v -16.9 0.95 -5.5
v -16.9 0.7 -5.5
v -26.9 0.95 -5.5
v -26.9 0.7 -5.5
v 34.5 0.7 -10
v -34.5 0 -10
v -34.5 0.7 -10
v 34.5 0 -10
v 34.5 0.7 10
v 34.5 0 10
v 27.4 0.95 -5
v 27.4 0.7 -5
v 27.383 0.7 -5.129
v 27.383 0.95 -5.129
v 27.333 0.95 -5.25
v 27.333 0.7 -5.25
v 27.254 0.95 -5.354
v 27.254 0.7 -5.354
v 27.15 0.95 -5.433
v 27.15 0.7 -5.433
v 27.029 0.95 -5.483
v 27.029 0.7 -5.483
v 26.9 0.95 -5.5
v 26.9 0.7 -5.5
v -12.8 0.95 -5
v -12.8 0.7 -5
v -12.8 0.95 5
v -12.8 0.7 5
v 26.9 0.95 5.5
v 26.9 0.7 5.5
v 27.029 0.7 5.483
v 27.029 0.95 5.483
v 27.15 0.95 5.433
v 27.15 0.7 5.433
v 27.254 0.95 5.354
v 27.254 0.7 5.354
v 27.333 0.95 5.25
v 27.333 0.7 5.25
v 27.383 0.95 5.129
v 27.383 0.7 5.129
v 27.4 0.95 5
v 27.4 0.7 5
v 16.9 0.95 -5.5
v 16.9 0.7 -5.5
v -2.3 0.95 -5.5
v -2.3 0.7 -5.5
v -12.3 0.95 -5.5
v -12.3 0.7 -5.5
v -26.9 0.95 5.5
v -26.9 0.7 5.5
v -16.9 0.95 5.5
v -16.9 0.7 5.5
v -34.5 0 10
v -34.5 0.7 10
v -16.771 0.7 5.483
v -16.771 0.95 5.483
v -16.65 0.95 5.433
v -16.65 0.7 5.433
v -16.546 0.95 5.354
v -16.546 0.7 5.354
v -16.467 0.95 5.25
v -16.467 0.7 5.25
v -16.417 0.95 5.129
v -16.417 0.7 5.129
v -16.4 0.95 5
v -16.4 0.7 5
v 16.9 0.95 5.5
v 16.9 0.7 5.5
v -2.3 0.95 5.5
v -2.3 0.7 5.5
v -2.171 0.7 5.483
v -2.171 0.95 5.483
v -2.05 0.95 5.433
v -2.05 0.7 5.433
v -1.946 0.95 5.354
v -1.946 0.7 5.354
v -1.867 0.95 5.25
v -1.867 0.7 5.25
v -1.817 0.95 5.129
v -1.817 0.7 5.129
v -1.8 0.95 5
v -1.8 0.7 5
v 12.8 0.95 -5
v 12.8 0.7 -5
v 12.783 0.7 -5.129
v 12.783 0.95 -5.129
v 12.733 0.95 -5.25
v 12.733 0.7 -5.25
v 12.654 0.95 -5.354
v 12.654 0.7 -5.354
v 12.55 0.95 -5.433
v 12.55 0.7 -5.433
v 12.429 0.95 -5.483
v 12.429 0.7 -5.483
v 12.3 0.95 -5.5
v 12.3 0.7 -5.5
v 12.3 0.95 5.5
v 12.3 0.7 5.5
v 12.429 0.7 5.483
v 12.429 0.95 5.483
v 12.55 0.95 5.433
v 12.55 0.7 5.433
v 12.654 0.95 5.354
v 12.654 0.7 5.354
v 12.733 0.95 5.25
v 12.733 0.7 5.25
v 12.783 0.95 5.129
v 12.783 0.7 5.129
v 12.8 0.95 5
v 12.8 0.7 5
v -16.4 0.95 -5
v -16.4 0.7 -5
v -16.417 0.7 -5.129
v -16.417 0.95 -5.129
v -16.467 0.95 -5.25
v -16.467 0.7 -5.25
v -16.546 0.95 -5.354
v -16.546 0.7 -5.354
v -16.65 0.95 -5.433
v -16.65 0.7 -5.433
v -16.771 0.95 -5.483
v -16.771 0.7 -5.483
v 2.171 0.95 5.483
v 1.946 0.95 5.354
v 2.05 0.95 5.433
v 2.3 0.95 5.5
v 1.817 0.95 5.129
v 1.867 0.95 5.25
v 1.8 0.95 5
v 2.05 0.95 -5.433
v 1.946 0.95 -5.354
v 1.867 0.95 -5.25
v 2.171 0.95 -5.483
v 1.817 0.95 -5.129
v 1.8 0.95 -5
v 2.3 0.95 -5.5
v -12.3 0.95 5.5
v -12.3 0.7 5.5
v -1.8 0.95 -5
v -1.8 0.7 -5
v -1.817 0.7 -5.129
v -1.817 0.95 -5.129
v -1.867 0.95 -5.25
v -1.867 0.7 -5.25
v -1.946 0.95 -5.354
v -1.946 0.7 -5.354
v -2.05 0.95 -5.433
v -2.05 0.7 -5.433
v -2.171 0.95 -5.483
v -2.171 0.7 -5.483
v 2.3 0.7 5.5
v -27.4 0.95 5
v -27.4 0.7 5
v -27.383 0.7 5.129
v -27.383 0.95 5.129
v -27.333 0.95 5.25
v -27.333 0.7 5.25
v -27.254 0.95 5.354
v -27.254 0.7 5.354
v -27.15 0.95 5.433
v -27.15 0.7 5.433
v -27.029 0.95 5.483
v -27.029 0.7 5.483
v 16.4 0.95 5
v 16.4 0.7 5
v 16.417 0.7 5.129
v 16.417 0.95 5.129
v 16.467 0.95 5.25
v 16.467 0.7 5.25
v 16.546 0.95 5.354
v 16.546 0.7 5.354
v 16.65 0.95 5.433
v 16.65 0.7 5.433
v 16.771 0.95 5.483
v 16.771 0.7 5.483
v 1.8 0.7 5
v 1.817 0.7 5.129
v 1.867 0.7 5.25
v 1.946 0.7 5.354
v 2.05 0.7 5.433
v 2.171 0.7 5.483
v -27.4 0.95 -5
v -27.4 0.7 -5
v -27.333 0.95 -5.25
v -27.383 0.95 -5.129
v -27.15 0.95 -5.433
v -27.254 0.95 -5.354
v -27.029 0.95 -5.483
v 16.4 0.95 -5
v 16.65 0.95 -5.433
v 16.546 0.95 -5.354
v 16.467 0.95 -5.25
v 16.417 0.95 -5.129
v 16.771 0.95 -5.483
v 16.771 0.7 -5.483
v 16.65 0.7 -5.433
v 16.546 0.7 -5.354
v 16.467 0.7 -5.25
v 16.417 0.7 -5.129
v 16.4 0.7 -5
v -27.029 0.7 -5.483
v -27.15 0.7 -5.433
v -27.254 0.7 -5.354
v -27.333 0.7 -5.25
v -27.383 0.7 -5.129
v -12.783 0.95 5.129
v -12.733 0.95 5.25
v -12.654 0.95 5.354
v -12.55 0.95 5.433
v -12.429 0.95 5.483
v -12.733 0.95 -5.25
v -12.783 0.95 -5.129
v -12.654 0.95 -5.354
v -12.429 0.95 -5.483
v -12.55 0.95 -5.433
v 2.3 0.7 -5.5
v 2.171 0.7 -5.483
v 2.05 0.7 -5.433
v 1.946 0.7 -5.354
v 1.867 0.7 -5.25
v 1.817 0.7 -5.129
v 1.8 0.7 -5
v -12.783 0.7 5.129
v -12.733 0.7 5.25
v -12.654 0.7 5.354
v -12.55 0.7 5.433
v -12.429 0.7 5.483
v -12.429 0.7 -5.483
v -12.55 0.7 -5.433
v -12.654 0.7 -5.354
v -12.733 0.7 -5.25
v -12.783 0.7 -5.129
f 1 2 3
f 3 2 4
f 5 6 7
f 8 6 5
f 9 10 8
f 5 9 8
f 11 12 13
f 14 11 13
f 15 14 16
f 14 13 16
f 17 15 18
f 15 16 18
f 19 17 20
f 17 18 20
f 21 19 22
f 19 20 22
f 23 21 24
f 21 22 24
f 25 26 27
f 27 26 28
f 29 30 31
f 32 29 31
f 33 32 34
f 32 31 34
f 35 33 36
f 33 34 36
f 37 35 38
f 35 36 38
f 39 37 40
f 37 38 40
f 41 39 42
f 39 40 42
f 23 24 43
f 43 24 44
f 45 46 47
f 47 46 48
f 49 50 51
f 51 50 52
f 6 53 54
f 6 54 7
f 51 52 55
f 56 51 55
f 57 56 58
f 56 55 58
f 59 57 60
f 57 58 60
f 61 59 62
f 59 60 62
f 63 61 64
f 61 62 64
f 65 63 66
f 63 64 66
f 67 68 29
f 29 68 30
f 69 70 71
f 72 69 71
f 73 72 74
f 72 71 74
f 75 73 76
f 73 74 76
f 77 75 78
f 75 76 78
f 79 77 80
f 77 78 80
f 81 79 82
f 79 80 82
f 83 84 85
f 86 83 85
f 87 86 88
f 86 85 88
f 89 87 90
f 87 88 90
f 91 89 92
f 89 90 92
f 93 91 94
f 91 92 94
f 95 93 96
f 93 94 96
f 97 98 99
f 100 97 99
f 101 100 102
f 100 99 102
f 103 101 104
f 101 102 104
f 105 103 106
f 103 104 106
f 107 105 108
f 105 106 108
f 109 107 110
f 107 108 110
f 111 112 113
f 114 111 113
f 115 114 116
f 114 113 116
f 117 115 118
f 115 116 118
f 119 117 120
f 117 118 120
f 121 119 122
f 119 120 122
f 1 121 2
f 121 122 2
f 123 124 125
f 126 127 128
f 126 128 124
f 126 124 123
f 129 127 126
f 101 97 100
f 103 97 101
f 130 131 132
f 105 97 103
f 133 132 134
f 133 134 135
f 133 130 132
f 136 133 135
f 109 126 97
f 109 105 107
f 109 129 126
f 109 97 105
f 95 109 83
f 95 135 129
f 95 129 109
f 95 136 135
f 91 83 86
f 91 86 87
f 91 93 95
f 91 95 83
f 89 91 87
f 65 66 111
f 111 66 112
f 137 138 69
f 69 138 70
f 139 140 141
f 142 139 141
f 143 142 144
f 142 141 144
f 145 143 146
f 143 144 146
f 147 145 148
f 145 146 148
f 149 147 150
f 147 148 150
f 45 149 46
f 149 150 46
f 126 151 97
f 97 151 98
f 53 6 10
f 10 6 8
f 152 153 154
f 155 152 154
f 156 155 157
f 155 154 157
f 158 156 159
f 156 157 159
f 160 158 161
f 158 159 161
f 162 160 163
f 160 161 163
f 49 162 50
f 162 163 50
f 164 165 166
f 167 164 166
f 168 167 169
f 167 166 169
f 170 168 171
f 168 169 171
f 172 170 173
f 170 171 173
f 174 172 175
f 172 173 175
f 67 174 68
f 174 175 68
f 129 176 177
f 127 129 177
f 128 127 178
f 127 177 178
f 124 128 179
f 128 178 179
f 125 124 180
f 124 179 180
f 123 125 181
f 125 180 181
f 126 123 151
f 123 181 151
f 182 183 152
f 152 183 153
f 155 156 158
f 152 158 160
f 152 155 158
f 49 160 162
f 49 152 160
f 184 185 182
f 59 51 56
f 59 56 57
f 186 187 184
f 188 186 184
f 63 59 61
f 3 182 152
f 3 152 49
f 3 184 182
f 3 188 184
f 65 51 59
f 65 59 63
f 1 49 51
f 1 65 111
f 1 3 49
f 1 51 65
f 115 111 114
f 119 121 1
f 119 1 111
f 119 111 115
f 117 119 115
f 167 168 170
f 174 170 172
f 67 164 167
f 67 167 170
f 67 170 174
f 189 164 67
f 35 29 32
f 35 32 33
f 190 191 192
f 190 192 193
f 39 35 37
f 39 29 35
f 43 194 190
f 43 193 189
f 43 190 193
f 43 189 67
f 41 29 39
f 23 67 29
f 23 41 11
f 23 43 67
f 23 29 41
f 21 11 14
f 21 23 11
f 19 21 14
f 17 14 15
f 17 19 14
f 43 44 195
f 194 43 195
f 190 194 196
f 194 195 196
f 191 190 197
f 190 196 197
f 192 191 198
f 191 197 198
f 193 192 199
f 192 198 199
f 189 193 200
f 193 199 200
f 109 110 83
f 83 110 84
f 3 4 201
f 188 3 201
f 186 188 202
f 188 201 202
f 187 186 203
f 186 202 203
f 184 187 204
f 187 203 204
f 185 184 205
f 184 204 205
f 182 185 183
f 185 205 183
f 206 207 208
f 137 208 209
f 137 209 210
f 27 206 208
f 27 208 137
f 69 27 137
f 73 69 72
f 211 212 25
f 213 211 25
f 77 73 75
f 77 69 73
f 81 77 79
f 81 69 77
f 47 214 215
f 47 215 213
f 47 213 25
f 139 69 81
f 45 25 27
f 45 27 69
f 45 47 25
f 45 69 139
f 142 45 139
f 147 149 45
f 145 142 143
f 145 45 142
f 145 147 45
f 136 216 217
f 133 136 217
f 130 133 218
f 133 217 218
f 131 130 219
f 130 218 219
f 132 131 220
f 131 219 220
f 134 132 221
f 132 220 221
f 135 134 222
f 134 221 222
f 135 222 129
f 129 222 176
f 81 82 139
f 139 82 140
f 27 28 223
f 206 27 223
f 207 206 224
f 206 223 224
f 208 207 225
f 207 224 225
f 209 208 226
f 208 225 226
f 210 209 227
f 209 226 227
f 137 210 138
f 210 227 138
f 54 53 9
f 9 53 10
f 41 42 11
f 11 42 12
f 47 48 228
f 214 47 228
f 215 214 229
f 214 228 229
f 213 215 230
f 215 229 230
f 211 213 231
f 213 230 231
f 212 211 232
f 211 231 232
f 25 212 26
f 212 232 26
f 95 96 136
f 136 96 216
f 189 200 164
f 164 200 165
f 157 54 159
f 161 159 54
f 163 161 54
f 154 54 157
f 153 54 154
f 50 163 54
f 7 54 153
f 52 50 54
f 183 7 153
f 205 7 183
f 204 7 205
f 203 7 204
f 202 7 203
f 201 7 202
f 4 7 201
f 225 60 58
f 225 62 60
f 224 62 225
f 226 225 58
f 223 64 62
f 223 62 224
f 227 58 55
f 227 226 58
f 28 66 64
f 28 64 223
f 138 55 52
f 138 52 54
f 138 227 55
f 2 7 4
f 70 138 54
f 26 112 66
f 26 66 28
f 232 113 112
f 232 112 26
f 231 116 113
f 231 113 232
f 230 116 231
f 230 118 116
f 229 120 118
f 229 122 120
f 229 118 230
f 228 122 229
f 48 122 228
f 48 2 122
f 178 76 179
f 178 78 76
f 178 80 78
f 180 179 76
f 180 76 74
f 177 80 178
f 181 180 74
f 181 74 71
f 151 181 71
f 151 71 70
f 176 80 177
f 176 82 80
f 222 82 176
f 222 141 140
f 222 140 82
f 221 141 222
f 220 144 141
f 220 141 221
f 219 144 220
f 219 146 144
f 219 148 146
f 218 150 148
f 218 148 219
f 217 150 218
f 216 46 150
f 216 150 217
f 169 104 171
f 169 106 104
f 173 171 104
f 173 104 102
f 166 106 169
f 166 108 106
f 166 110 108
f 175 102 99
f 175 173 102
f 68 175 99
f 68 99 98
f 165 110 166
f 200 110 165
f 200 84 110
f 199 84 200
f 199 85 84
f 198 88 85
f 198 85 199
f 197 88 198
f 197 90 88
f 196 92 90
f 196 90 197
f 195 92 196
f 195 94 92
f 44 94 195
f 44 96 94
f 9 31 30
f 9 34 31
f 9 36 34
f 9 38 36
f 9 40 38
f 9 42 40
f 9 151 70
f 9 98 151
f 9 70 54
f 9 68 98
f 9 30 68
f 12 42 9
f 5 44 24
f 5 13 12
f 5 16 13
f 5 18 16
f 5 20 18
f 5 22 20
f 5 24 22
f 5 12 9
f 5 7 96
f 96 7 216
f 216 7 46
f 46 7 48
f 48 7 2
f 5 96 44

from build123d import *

# Parameters (mm, degrees)
SKETCH1_W           = 69
SKETCH1_H           = 20
BOSS_EXTRUDE1_DEPTH = 0.7
BOSS_EXTRUDE2_DEPTH = 0.25


with BuildPart() as part:
    # Sketch1 → Boss-Extrude1 (new body)
    with BuildSketch(Plane(origin=(0, 0, 0), x_dir=(1, 0, 0), z_dir=(0, 1, 0))):
        Rectangle(SKETCH1_W, SKETCH1_H)
    extrude(amount=BOSS_EXTRUDE1_DEPTH)

    # Sketch2 → Boss-Extrude2 (add)
    with BuildSketch(Plane(origin=(0, 0.7, 0), x_dir=(1, 0, 0), z_dir=(0, 1, 0))):
        with BuildLine():
            Line((-26.9, -5.5), (-16.9, -5.5))
            ThreePointArc((-16.9, -5.5), (-16.546446609, -5.353553391), (-16.4, -5))
            Line((-16.4, -5), (-16.4, 5))
            ThreePointArc((-16.4, 5), (-16.546446609, 5.353553391), (-16.9, 5.5))
            Line((-16.9, 5.5), (-26.9, 5.5))
            ThreePointArc((-26.9, 5.5), (-27.253553391, 5.353553391), (-27.4, 5))
            Line((-27.4, 5), (-27.4, -5))
            ThreePointArc((-27.4, -5), (-27.253553391, -5.353553391), (-26.9, -5.5))
        make_face()
        with BuildLine():
            Line((-12.3, -5.5), (-2.3, -5.5))
            ThreePointArc((-2.3, -5.5), (-1.946446609, -5.353553391), (-1.8, -5))
            Line((-1.8, -5), (-1.8, 5))
            ThreePointArc((-1.8, 5), (-1.946446609, 5.353553391), (-2.3, 5.5))
            Line((-2.3, 5.5), (-12.3, 5.5))
            ThreePointArc((-12.3, 5.5), (-12.653553391, 5.353553391), (-12.8, 5))
            Line((-12.8, 5), (-12.8, -5))
            ThreePointArc((-12.8, -5), (-12.653553391, -5.353553391), (-12.3, -5.5))
        make_face()
        with BuildLine():
            Line((2.3, -5.5), (12.3, -5.5))
            ThreePointArc((12.3, -5.5), (12.653553391, -5.353553391), (12.8, -5))
            Line((12.8, -5), (12.8, 5))
            ThreePointArc((12.8, 5), (12.653553391, 5.353553391), (12.3, 5.5))
            Line((12.3, 5.5), (2.3, 5.5))
            ThreePointArc((2.3, 5.5), (1.946446609, 5.353553391), (1.8, 5))
            Line((1.8, 5), (1.8, -5))
            ThreePointArc((1.8, -5), (1.946446609, -5.353553391), (2.3, -5.5))
        make_face()
        with BuildLine():
            Line((16.9, -5.5), (26.9, -5.5))
            ThreePointArc((26.9, -5.5), (27.253553391, -5.353553391), (27.4, -5))
            Line((27.4, -5), (27.4, 5))
            ThreePointArc((27.4, 5), (27.253553391, 5.353553391), (26.9, 5.5))
            Line((26.9, 5.5), (16.9, 5.5))
            ThreePointArc((16.9, 5.5), (16.546446609, 5.353553391), (16.4, 5))
            Line((16.4, 5), (16.4, -5))
            ThreePointArc((16.4, -5), (16.546446609, -5.353553391), (16.9, -5.5))
        make_face()
    extrude(amount=BOSS_EXTRUDE2_DEPTH)


solid = part.part
